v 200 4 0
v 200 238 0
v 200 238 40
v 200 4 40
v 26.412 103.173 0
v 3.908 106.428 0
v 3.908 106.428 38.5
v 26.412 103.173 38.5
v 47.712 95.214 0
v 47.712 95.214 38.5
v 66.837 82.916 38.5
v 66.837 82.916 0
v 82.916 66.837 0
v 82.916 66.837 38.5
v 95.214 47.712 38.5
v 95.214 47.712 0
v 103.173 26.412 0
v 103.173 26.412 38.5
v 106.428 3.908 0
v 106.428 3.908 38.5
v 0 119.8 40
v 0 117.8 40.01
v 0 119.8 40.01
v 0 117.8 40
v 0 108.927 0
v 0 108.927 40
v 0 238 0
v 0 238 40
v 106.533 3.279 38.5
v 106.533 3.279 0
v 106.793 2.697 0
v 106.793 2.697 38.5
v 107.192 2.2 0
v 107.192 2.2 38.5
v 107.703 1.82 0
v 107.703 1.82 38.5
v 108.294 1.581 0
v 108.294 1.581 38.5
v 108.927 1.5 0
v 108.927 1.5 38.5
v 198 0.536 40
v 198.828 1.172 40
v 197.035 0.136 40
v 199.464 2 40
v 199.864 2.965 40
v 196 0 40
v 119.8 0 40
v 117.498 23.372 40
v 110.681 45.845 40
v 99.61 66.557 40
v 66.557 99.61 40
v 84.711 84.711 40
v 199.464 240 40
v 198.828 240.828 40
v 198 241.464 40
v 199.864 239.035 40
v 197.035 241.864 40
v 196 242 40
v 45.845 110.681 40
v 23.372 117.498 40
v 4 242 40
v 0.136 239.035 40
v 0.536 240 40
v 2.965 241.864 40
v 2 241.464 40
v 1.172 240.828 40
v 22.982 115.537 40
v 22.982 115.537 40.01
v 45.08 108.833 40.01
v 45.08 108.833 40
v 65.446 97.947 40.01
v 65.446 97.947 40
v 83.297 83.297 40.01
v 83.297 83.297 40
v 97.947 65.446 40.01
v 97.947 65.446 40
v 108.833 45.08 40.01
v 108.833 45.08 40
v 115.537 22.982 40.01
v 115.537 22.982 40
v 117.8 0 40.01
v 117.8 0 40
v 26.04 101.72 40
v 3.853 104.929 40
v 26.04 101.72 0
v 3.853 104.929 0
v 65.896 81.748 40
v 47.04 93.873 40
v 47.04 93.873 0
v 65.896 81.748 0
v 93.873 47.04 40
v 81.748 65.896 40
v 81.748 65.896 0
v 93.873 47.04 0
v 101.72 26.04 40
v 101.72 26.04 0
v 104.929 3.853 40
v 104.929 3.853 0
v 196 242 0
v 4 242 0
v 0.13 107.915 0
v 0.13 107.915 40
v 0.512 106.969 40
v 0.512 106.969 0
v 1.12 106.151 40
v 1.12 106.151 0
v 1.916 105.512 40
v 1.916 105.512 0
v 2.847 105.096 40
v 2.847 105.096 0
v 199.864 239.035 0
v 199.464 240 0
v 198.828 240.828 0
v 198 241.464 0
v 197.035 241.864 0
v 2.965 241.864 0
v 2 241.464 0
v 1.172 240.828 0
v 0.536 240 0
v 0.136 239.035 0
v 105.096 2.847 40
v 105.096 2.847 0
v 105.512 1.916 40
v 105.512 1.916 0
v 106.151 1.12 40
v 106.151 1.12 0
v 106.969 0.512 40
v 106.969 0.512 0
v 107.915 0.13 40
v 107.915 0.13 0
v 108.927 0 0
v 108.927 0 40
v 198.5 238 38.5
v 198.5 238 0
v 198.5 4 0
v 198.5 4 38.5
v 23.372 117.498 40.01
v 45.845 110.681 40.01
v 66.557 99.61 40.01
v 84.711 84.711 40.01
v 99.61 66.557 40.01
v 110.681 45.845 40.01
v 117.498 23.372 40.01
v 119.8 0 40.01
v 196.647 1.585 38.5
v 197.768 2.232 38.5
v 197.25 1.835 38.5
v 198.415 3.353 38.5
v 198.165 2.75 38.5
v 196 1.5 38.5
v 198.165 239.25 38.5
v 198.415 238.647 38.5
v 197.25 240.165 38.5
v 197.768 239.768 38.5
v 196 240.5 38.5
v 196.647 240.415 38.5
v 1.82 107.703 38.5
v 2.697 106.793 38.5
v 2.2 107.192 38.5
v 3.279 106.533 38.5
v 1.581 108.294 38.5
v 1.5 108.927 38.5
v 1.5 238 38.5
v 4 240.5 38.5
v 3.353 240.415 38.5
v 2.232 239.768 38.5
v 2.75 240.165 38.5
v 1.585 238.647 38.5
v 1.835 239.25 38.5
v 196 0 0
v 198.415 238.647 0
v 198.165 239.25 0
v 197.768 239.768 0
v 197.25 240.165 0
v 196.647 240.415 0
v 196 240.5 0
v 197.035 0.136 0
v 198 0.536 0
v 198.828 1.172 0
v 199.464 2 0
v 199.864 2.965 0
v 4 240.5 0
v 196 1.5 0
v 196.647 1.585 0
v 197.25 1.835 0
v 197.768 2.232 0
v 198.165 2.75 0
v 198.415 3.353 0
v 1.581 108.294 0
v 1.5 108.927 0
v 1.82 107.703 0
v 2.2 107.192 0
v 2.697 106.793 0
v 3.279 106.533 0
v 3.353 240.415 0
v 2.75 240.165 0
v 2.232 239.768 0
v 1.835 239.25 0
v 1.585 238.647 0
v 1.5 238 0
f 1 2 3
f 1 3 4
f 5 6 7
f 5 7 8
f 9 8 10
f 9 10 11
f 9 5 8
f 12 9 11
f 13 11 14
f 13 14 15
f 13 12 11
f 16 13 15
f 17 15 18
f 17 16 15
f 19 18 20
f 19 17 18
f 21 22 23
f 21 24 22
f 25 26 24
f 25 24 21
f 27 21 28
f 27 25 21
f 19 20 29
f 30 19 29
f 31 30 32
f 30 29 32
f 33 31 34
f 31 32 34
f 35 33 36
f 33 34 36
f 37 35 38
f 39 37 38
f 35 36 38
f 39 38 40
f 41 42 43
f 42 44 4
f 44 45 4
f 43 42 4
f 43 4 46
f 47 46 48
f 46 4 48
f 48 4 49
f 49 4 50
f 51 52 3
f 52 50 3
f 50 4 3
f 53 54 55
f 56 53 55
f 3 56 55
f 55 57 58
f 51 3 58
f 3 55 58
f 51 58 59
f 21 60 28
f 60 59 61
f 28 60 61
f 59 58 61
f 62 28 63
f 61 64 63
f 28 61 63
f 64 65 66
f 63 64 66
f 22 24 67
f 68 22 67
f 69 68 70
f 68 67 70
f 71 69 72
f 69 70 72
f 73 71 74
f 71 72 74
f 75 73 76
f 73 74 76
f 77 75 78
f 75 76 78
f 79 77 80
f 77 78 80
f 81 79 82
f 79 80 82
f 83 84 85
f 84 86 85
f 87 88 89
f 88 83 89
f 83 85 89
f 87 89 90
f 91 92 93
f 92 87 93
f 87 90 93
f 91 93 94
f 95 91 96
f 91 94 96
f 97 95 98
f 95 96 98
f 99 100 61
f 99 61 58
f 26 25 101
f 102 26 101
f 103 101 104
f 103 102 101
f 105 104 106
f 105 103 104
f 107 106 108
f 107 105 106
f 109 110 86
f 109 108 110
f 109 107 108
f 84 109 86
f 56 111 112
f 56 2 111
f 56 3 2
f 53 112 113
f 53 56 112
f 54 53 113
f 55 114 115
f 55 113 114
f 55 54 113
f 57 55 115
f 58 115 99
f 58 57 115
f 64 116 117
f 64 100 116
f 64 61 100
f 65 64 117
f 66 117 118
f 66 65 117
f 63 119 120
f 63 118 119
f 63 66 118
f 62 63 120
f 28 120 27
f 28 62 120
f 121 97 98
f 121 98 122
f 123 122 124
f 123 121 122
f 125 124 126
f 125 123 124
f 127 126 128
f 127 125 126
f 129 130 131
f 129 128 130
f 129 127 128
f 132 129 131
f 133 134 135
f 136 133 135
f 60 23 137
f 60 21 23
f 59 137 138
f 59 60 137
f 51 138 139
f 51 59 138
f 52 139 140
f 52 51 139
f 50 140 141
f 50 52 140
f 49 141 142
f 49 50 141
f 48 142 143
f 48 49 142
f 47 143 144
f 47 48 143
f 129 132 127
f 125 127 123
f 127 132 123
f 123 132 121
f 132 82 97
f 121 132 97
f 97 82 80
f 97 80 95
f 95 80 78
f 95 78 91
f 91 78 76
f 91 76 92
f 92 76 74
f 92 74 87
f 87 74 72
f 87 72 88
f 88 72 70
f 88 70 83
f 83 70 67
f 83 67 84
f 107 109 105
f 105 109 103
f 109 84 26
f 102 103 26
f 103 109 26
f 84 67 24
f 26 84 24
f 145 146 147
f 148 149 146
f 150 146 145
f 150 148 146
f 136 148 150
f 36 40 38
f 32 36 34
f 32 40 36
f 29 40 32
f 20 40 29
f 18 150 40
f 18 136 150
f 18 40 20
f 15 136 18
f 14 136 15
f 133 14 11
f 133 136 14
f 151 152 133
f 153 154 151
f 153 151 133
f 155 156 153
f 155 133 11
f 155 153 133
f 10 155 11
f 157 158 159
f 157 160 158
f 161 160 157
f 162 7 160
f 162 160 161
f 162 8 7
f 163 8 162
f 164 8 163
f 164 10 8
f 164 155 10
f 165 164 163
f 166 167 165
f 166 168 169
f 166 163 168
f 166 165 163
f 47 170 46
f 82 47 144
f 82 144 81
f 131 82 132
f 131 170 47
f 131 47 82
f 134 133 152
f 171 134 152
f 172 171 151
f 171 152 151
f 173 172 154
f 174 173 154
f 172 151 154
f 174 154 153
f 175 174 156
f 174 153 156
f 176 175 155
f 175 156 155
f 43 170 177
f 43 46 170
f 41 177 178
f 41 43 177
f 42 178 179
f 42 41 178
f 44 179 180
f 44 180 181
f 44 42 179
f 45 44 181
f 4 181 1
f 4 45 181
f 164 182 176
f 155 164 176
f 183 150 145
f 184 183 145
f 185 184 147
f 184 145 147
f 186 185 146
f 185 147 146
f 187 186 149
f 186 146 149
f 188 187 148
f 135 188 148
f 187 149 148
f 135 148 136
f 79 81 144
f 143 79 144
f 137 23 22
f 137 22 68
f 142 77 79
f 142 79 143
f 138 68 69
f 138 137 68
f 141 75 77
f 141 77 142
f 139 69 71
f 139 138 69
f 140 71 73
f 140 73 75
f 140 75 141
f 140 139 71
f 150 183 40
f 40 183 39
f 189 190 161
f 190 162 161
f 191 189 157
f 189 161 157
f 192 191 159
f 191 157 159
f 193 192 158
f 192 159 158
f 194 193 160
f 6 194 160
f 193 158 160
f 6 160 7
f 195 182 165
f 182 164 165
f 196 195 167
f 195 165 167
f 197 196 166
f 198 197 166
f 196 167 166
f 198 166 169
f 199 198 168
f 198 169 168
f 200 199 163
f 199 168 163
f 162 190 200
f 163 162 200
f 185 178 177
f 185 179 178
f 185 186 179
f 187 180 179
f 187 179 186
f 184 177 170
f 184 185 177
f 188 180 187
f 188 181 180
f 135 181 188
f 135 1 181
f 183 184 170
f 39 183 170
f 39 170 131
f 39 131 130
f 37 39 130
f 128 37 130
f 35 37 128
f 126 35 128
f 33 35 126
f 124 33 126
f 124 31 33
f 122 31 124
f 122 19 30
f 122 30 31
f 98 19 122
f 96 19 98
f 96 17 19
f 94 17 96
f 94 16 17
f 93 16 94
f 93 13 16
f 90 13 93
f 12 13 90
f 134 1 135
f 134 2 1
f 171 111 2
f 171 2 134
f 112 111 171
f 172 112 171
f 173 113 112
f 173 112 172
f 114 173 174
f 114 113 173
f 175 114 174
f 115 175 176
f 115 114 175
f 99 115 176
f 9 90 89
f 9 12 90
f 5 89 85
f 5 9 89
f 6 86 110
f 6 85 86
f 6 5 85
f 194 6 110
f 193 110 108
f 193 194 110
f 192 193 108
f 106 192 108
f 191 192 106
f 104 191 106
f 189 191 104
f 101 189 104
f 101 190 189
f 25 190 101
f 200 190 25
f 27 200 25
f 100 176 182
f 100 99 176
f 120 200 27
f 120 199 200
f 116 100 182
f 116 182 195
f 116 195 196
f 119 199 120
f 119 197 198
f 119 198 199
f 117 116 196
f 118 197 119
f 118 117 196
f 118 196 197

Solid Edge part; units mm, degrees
sketch "Sketch1" plane through (0, 0, 0) normal (0, 0, 1) x (1, 0, 0)
  line L0 (200, 0) -> (105, 0)
  arc A0 (105, 0) -> (0, 105) centre (0, 0) ccw
  line L1 (0, 105) -> (0, 242)
  line L2 (0, 242) -> (200, 242)
  line L3 (200, 242) -> (200, 0)
extrude "Protrusion1" add sketch "Sketch1" along normal blind 40
fillet "Redondeo_1" radius 4 5 edges at (200, 0, 20) (0, 105, 20) (105, 0, 20) (200, 242, 20) (0, 242, 20)
shell "Espesor_2" thickness 1.5 removed faces 1 at (168.6667, 42.7533, 0)
sketch "Sketch2" plane through (100, 121, 40) normal (0, 0, 1) x (1, 0, 0)
  arc A0 (-100, -3.2) -> (17.8, -121) centre (-100, -121) cw
  line L0 (17.8, -121) -> (19.8, -121)
  arc A1 (-100, -1.2) -> (19.8, -121) centre (-100, -121) cw
  line L1 (-100, -1.2) -> (-100, -3.2)
extrude "ProtrusiónExtruida_2" add sketch "Sketch2" along normal blind 0.01
